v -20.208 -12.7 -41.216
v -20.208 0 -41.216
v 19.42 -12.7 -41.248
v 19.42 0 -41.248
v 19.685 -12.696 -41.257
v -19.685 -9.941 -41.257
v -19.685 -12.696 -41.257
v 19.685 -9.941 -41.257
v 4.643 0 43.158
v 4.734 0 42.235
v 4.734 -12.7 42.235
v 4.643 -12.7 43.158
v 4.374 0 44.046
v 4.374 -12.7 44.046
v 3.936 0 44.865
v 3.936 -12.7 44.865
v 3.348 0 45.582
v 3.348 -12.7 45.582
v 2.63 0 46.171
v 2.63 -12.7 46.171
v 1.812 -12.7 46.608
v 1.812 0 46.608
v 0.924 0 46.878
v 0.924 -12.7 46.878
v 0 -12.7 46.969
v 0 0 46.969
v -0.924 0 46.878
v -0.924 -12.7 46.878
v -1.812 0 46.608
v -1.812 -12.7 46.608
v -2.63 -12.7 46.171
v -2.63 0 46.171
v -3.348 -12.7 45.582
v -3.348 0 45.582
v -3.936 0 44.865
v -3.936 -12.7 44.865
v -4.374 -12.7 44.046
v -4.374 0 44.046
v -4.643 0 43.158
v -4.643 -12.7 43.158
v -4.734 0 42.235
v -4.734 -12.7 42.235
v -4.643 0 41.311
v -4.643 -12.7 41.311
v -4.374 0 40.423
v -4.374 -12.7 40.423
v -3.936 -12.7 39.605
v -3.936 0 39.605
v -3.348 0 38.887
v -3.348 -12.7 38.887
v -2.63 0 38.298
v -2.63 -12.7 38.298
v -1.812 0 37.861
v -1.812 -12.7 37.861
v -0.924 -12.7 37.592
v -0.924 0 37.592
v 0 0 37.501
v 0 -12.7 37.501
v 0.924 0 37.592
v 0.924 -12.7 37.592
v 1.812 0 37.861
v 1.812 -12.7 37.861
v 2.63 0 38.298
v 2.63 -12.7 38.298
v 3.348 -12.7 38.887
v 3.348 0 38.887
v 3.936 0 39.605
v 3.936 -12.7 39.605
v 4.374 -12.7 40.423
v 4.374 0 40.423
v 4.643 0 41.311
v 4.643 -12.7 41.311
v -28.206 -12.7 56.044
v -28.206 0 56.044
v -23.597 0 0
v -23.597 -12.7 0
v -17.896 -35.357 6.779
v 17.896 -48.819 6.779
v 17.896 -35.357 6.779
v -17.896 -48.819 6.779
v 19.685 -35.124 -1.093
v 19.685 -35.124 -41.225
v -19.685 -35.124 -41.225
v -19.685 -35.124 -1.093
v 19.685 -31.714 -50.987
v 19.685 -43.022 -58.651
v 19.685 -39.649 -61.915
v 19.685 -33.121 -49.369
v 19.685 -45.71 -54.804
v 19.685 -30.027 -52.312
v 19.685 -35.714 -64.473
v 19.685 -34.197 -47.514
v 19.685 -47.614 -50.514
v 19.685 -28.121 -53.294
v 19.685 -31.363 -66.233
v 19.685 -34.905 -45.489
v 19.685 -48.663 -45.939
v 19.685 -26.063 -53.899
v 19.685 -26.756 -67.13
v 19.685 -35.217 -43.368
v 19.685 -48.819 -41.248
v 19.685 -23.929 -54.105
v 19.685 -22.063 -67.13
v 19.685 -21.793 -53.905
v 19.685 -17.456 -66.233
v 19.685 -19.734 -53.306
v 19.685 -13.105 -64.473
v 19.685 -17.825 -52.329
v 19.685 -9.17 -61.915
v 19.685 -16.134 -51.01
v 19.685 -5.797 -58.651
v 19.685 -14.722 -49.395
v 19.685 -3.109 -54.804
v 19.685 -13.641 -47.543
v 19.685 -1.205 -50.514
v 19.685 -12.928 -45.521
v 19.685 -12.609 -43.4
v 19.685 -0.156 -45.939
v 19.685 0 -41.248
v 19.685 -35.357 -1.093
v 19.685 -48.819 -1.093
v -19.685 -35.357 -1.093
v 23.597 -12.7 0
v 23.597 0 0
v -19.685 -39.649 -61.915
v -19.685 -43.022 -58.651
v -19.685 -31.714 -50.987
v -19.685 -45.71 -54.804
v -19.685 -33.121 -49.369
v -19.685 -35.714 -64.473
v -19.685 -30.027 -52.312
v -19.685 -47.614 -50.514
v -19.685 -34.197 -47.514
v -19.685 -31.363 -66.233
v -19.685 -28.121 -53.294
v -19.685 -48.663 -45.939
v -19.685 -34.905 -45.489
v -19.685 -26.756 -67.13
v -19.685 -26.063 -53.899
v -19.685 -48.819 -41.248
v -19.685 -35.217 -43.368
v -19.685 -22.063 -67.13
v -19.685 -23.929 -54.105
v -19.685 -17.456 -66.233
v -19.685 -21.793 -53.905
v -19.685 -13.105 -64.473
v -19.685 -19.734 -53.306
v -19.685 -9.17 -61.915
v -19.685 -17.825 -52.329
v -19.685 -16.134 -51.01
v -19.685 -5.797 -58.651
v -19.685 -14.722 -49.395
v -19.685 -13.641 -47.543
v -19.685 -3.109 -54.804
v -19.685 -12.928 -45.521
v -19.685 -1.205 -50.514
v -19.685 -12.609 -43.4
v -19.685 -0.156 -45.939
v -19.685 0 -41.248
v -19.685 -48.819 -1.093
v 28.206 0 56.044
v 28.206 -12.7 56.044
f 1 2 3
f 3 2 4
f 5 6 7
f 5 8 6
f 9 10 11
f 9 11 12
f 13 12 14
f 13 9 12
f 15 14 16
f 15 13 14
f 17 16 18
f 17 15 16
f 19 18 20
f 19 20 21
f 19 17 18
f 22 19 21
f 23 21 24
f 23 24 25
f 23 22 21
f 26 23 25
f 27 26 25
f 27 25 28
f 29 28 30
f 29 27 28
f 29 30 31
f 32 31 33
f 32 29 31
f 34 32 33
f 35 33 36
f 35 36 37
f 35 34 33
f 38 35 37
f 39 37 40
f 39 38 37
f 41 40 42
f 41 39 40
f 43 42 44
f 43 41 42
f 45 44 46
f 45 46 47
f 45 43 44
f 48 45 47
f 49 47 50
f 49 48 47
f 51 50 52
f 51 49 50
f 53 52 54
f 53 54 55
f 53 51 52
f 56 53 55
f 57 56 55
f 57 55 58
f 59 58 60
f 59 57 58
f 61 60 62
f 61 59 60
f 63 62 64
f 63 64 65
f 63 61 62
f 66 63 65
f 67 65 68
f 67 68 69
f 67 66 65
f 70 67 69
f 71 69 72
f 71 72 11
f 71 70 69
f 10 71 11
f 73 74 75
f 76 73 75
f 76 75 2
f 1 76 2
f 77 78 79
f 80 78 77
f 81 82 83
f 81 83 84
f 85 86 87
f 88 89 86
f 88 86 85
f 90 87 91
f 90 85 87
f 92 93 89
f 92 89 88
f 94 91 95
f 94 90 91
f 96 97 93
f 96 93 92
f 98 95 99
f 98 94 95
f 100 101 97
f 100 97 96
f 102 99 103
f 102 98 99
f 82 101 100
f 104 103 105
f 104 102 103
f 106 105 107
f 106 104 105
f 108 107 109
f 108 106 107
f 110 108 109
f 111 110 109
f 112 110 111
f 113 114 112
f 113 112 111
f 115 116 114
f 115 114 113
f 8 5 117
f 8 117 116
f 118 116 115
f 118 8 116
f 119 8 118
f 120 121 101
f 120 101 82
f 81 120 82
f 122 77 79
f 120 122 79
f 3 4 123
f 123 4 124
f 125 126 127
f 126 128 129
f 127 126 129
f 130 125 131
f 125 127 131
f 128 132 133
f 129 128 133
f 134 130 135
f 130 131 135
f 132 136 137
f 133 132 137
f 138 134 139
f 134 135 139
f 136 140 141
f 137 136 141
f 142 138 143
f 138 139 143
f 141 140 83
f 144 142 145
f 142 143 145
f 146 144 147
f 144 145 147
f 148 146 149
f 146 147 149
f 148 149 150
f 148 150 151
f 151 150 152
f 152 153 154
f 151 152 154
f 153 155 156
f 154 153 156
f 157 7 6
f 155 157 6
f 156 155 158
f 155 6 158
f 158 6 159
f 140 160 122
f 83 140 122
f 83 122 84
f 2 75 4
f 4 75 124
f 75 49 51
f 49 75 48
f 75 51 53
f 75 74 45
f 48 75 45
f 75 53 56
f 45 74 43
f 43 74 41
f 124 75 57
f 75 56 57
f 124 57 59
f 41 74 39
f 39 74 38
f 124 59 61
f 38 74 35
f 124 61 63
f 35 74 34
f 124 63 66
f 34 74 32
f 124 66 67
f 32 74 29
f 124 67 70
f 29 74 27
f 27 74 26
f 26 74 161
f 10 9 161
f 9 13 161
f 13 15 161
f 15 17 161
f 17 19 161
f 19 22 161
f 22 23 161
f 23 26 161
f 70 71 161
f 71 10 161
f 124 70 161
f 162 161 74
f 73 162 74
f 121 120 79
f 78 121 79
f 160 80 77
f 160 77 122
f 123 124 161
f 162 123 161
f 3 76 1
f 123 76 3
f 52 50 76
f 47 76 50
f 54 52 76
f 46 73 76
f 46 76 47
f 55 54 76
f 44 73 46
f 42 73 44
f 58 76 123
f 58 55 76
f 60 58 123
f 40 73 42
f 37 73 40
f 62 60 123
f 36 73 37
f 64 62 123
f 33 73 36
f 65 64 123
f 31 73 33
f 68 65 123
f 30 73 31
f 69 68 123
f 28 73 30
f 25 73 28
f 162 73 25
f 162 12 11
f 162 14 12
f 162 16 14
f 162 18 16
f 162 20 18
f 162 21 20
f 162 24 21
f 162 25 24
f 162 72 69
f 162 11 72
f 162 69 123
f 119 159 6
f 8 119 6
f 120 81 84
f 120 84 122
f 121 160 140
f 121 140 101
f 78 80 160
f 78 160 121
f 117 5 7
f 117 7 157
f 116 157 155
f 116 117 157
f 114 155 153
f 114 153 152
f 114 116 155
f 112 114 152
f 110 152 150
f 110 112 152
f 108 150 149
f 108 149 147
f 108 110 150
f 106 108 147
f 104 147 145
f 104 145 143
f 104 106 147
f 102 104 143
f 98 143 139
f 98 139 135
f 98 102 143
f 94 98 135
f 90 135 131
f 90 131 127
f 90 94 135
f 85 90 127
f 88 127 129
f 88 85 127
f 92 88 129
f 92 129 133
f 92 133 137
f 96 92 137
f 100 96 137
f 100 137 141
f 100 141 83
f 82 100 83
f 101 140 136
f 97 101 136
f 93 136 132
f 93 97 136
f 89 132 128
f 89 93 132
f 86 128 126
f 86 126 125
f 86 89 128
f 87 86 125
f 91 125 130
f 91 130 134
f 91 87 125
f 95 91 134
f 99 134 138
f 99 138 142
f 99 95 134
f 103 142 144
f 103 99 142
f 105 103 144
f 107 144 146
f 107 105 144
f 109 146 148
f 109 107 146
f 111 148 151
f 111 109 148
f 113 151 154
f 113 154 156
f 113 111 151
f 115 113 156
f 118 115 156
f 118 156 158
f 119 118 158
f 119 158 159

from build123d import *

# Parameters (mm, degrees)
F0_R     = 4.7340858412
F1_DEPTH = 12.7
F3_DEPTH = 19.685
F5_DEPTH = 13.462


with BuildPart() as f1:
    # F0 (on Front) → F1 (new body)
    with BuildSketch(Plane.XZ):
        Polygon((28.2062906772, 56.0438744724), (-28.2062906772, 56.0438744724), (-23.5974192619, 0), (-20.2079608097, -41.2158133545), (19.4203909487, -41.2481687963), (23.5974192619, 0), align=None)
        with Locations((0, 42.2346815467)):
            Circle(F0_R, mode=Mode.SUBTRACT)
    extrude(amount=F1_DEPTH)


with BuildPart() as f3:
    # F2 (on Right) → F3 (new body, symmetric)
    with BuildSketch(Plane.YZ):
        with BuildLine():
            Line((-9.9408207461, -41.2572398782), (-12.6955840965, -41.2572398782))
            ThreePointArc((-12.6955840965, -41.2572398782), (-23.9285376886, -54.1052616117), (-35.1244116515, -41.2249155343))
            Line((-35.1244116515, -41.2249155343), (-35.1244116515, -1.0932636214))
            Line((-35.1244116515, -1.0932636214), (-36.4736020565, -1.0932636214))
            Line((-36.4736020565, -1.0932636214), (-48.8187869123, -1.0932636214))
            Line((-48.8187869123, -1.0932636214), (-48.8187869123, -41.2482433021))
            ThreePointArc((-48.8187869123, -41.2482433021), (-24.4093934561, -67.2427849201), (0, -41.2482433021))
            Line((0, -41.2482433021), (-9.9408207461, -41.2572398782))
        make_face()
    extrude(amount=F3_DEPTH, both=True)

    # F4 (on face) → F5 (join)
    with BuildSketch(Plane.XZ.offset(48.8187869123)):
        Polygon((-17.896451056, 6.7789228633), (-19.685, -1.0932636214), (19.685, -1.0932636214), (17.896451056, 6.7789228633), (0, 6.7789228633), align=None)
    extrude(amount=-F5_DEPTH)


solid = Compound([f1.part, f3.part])
